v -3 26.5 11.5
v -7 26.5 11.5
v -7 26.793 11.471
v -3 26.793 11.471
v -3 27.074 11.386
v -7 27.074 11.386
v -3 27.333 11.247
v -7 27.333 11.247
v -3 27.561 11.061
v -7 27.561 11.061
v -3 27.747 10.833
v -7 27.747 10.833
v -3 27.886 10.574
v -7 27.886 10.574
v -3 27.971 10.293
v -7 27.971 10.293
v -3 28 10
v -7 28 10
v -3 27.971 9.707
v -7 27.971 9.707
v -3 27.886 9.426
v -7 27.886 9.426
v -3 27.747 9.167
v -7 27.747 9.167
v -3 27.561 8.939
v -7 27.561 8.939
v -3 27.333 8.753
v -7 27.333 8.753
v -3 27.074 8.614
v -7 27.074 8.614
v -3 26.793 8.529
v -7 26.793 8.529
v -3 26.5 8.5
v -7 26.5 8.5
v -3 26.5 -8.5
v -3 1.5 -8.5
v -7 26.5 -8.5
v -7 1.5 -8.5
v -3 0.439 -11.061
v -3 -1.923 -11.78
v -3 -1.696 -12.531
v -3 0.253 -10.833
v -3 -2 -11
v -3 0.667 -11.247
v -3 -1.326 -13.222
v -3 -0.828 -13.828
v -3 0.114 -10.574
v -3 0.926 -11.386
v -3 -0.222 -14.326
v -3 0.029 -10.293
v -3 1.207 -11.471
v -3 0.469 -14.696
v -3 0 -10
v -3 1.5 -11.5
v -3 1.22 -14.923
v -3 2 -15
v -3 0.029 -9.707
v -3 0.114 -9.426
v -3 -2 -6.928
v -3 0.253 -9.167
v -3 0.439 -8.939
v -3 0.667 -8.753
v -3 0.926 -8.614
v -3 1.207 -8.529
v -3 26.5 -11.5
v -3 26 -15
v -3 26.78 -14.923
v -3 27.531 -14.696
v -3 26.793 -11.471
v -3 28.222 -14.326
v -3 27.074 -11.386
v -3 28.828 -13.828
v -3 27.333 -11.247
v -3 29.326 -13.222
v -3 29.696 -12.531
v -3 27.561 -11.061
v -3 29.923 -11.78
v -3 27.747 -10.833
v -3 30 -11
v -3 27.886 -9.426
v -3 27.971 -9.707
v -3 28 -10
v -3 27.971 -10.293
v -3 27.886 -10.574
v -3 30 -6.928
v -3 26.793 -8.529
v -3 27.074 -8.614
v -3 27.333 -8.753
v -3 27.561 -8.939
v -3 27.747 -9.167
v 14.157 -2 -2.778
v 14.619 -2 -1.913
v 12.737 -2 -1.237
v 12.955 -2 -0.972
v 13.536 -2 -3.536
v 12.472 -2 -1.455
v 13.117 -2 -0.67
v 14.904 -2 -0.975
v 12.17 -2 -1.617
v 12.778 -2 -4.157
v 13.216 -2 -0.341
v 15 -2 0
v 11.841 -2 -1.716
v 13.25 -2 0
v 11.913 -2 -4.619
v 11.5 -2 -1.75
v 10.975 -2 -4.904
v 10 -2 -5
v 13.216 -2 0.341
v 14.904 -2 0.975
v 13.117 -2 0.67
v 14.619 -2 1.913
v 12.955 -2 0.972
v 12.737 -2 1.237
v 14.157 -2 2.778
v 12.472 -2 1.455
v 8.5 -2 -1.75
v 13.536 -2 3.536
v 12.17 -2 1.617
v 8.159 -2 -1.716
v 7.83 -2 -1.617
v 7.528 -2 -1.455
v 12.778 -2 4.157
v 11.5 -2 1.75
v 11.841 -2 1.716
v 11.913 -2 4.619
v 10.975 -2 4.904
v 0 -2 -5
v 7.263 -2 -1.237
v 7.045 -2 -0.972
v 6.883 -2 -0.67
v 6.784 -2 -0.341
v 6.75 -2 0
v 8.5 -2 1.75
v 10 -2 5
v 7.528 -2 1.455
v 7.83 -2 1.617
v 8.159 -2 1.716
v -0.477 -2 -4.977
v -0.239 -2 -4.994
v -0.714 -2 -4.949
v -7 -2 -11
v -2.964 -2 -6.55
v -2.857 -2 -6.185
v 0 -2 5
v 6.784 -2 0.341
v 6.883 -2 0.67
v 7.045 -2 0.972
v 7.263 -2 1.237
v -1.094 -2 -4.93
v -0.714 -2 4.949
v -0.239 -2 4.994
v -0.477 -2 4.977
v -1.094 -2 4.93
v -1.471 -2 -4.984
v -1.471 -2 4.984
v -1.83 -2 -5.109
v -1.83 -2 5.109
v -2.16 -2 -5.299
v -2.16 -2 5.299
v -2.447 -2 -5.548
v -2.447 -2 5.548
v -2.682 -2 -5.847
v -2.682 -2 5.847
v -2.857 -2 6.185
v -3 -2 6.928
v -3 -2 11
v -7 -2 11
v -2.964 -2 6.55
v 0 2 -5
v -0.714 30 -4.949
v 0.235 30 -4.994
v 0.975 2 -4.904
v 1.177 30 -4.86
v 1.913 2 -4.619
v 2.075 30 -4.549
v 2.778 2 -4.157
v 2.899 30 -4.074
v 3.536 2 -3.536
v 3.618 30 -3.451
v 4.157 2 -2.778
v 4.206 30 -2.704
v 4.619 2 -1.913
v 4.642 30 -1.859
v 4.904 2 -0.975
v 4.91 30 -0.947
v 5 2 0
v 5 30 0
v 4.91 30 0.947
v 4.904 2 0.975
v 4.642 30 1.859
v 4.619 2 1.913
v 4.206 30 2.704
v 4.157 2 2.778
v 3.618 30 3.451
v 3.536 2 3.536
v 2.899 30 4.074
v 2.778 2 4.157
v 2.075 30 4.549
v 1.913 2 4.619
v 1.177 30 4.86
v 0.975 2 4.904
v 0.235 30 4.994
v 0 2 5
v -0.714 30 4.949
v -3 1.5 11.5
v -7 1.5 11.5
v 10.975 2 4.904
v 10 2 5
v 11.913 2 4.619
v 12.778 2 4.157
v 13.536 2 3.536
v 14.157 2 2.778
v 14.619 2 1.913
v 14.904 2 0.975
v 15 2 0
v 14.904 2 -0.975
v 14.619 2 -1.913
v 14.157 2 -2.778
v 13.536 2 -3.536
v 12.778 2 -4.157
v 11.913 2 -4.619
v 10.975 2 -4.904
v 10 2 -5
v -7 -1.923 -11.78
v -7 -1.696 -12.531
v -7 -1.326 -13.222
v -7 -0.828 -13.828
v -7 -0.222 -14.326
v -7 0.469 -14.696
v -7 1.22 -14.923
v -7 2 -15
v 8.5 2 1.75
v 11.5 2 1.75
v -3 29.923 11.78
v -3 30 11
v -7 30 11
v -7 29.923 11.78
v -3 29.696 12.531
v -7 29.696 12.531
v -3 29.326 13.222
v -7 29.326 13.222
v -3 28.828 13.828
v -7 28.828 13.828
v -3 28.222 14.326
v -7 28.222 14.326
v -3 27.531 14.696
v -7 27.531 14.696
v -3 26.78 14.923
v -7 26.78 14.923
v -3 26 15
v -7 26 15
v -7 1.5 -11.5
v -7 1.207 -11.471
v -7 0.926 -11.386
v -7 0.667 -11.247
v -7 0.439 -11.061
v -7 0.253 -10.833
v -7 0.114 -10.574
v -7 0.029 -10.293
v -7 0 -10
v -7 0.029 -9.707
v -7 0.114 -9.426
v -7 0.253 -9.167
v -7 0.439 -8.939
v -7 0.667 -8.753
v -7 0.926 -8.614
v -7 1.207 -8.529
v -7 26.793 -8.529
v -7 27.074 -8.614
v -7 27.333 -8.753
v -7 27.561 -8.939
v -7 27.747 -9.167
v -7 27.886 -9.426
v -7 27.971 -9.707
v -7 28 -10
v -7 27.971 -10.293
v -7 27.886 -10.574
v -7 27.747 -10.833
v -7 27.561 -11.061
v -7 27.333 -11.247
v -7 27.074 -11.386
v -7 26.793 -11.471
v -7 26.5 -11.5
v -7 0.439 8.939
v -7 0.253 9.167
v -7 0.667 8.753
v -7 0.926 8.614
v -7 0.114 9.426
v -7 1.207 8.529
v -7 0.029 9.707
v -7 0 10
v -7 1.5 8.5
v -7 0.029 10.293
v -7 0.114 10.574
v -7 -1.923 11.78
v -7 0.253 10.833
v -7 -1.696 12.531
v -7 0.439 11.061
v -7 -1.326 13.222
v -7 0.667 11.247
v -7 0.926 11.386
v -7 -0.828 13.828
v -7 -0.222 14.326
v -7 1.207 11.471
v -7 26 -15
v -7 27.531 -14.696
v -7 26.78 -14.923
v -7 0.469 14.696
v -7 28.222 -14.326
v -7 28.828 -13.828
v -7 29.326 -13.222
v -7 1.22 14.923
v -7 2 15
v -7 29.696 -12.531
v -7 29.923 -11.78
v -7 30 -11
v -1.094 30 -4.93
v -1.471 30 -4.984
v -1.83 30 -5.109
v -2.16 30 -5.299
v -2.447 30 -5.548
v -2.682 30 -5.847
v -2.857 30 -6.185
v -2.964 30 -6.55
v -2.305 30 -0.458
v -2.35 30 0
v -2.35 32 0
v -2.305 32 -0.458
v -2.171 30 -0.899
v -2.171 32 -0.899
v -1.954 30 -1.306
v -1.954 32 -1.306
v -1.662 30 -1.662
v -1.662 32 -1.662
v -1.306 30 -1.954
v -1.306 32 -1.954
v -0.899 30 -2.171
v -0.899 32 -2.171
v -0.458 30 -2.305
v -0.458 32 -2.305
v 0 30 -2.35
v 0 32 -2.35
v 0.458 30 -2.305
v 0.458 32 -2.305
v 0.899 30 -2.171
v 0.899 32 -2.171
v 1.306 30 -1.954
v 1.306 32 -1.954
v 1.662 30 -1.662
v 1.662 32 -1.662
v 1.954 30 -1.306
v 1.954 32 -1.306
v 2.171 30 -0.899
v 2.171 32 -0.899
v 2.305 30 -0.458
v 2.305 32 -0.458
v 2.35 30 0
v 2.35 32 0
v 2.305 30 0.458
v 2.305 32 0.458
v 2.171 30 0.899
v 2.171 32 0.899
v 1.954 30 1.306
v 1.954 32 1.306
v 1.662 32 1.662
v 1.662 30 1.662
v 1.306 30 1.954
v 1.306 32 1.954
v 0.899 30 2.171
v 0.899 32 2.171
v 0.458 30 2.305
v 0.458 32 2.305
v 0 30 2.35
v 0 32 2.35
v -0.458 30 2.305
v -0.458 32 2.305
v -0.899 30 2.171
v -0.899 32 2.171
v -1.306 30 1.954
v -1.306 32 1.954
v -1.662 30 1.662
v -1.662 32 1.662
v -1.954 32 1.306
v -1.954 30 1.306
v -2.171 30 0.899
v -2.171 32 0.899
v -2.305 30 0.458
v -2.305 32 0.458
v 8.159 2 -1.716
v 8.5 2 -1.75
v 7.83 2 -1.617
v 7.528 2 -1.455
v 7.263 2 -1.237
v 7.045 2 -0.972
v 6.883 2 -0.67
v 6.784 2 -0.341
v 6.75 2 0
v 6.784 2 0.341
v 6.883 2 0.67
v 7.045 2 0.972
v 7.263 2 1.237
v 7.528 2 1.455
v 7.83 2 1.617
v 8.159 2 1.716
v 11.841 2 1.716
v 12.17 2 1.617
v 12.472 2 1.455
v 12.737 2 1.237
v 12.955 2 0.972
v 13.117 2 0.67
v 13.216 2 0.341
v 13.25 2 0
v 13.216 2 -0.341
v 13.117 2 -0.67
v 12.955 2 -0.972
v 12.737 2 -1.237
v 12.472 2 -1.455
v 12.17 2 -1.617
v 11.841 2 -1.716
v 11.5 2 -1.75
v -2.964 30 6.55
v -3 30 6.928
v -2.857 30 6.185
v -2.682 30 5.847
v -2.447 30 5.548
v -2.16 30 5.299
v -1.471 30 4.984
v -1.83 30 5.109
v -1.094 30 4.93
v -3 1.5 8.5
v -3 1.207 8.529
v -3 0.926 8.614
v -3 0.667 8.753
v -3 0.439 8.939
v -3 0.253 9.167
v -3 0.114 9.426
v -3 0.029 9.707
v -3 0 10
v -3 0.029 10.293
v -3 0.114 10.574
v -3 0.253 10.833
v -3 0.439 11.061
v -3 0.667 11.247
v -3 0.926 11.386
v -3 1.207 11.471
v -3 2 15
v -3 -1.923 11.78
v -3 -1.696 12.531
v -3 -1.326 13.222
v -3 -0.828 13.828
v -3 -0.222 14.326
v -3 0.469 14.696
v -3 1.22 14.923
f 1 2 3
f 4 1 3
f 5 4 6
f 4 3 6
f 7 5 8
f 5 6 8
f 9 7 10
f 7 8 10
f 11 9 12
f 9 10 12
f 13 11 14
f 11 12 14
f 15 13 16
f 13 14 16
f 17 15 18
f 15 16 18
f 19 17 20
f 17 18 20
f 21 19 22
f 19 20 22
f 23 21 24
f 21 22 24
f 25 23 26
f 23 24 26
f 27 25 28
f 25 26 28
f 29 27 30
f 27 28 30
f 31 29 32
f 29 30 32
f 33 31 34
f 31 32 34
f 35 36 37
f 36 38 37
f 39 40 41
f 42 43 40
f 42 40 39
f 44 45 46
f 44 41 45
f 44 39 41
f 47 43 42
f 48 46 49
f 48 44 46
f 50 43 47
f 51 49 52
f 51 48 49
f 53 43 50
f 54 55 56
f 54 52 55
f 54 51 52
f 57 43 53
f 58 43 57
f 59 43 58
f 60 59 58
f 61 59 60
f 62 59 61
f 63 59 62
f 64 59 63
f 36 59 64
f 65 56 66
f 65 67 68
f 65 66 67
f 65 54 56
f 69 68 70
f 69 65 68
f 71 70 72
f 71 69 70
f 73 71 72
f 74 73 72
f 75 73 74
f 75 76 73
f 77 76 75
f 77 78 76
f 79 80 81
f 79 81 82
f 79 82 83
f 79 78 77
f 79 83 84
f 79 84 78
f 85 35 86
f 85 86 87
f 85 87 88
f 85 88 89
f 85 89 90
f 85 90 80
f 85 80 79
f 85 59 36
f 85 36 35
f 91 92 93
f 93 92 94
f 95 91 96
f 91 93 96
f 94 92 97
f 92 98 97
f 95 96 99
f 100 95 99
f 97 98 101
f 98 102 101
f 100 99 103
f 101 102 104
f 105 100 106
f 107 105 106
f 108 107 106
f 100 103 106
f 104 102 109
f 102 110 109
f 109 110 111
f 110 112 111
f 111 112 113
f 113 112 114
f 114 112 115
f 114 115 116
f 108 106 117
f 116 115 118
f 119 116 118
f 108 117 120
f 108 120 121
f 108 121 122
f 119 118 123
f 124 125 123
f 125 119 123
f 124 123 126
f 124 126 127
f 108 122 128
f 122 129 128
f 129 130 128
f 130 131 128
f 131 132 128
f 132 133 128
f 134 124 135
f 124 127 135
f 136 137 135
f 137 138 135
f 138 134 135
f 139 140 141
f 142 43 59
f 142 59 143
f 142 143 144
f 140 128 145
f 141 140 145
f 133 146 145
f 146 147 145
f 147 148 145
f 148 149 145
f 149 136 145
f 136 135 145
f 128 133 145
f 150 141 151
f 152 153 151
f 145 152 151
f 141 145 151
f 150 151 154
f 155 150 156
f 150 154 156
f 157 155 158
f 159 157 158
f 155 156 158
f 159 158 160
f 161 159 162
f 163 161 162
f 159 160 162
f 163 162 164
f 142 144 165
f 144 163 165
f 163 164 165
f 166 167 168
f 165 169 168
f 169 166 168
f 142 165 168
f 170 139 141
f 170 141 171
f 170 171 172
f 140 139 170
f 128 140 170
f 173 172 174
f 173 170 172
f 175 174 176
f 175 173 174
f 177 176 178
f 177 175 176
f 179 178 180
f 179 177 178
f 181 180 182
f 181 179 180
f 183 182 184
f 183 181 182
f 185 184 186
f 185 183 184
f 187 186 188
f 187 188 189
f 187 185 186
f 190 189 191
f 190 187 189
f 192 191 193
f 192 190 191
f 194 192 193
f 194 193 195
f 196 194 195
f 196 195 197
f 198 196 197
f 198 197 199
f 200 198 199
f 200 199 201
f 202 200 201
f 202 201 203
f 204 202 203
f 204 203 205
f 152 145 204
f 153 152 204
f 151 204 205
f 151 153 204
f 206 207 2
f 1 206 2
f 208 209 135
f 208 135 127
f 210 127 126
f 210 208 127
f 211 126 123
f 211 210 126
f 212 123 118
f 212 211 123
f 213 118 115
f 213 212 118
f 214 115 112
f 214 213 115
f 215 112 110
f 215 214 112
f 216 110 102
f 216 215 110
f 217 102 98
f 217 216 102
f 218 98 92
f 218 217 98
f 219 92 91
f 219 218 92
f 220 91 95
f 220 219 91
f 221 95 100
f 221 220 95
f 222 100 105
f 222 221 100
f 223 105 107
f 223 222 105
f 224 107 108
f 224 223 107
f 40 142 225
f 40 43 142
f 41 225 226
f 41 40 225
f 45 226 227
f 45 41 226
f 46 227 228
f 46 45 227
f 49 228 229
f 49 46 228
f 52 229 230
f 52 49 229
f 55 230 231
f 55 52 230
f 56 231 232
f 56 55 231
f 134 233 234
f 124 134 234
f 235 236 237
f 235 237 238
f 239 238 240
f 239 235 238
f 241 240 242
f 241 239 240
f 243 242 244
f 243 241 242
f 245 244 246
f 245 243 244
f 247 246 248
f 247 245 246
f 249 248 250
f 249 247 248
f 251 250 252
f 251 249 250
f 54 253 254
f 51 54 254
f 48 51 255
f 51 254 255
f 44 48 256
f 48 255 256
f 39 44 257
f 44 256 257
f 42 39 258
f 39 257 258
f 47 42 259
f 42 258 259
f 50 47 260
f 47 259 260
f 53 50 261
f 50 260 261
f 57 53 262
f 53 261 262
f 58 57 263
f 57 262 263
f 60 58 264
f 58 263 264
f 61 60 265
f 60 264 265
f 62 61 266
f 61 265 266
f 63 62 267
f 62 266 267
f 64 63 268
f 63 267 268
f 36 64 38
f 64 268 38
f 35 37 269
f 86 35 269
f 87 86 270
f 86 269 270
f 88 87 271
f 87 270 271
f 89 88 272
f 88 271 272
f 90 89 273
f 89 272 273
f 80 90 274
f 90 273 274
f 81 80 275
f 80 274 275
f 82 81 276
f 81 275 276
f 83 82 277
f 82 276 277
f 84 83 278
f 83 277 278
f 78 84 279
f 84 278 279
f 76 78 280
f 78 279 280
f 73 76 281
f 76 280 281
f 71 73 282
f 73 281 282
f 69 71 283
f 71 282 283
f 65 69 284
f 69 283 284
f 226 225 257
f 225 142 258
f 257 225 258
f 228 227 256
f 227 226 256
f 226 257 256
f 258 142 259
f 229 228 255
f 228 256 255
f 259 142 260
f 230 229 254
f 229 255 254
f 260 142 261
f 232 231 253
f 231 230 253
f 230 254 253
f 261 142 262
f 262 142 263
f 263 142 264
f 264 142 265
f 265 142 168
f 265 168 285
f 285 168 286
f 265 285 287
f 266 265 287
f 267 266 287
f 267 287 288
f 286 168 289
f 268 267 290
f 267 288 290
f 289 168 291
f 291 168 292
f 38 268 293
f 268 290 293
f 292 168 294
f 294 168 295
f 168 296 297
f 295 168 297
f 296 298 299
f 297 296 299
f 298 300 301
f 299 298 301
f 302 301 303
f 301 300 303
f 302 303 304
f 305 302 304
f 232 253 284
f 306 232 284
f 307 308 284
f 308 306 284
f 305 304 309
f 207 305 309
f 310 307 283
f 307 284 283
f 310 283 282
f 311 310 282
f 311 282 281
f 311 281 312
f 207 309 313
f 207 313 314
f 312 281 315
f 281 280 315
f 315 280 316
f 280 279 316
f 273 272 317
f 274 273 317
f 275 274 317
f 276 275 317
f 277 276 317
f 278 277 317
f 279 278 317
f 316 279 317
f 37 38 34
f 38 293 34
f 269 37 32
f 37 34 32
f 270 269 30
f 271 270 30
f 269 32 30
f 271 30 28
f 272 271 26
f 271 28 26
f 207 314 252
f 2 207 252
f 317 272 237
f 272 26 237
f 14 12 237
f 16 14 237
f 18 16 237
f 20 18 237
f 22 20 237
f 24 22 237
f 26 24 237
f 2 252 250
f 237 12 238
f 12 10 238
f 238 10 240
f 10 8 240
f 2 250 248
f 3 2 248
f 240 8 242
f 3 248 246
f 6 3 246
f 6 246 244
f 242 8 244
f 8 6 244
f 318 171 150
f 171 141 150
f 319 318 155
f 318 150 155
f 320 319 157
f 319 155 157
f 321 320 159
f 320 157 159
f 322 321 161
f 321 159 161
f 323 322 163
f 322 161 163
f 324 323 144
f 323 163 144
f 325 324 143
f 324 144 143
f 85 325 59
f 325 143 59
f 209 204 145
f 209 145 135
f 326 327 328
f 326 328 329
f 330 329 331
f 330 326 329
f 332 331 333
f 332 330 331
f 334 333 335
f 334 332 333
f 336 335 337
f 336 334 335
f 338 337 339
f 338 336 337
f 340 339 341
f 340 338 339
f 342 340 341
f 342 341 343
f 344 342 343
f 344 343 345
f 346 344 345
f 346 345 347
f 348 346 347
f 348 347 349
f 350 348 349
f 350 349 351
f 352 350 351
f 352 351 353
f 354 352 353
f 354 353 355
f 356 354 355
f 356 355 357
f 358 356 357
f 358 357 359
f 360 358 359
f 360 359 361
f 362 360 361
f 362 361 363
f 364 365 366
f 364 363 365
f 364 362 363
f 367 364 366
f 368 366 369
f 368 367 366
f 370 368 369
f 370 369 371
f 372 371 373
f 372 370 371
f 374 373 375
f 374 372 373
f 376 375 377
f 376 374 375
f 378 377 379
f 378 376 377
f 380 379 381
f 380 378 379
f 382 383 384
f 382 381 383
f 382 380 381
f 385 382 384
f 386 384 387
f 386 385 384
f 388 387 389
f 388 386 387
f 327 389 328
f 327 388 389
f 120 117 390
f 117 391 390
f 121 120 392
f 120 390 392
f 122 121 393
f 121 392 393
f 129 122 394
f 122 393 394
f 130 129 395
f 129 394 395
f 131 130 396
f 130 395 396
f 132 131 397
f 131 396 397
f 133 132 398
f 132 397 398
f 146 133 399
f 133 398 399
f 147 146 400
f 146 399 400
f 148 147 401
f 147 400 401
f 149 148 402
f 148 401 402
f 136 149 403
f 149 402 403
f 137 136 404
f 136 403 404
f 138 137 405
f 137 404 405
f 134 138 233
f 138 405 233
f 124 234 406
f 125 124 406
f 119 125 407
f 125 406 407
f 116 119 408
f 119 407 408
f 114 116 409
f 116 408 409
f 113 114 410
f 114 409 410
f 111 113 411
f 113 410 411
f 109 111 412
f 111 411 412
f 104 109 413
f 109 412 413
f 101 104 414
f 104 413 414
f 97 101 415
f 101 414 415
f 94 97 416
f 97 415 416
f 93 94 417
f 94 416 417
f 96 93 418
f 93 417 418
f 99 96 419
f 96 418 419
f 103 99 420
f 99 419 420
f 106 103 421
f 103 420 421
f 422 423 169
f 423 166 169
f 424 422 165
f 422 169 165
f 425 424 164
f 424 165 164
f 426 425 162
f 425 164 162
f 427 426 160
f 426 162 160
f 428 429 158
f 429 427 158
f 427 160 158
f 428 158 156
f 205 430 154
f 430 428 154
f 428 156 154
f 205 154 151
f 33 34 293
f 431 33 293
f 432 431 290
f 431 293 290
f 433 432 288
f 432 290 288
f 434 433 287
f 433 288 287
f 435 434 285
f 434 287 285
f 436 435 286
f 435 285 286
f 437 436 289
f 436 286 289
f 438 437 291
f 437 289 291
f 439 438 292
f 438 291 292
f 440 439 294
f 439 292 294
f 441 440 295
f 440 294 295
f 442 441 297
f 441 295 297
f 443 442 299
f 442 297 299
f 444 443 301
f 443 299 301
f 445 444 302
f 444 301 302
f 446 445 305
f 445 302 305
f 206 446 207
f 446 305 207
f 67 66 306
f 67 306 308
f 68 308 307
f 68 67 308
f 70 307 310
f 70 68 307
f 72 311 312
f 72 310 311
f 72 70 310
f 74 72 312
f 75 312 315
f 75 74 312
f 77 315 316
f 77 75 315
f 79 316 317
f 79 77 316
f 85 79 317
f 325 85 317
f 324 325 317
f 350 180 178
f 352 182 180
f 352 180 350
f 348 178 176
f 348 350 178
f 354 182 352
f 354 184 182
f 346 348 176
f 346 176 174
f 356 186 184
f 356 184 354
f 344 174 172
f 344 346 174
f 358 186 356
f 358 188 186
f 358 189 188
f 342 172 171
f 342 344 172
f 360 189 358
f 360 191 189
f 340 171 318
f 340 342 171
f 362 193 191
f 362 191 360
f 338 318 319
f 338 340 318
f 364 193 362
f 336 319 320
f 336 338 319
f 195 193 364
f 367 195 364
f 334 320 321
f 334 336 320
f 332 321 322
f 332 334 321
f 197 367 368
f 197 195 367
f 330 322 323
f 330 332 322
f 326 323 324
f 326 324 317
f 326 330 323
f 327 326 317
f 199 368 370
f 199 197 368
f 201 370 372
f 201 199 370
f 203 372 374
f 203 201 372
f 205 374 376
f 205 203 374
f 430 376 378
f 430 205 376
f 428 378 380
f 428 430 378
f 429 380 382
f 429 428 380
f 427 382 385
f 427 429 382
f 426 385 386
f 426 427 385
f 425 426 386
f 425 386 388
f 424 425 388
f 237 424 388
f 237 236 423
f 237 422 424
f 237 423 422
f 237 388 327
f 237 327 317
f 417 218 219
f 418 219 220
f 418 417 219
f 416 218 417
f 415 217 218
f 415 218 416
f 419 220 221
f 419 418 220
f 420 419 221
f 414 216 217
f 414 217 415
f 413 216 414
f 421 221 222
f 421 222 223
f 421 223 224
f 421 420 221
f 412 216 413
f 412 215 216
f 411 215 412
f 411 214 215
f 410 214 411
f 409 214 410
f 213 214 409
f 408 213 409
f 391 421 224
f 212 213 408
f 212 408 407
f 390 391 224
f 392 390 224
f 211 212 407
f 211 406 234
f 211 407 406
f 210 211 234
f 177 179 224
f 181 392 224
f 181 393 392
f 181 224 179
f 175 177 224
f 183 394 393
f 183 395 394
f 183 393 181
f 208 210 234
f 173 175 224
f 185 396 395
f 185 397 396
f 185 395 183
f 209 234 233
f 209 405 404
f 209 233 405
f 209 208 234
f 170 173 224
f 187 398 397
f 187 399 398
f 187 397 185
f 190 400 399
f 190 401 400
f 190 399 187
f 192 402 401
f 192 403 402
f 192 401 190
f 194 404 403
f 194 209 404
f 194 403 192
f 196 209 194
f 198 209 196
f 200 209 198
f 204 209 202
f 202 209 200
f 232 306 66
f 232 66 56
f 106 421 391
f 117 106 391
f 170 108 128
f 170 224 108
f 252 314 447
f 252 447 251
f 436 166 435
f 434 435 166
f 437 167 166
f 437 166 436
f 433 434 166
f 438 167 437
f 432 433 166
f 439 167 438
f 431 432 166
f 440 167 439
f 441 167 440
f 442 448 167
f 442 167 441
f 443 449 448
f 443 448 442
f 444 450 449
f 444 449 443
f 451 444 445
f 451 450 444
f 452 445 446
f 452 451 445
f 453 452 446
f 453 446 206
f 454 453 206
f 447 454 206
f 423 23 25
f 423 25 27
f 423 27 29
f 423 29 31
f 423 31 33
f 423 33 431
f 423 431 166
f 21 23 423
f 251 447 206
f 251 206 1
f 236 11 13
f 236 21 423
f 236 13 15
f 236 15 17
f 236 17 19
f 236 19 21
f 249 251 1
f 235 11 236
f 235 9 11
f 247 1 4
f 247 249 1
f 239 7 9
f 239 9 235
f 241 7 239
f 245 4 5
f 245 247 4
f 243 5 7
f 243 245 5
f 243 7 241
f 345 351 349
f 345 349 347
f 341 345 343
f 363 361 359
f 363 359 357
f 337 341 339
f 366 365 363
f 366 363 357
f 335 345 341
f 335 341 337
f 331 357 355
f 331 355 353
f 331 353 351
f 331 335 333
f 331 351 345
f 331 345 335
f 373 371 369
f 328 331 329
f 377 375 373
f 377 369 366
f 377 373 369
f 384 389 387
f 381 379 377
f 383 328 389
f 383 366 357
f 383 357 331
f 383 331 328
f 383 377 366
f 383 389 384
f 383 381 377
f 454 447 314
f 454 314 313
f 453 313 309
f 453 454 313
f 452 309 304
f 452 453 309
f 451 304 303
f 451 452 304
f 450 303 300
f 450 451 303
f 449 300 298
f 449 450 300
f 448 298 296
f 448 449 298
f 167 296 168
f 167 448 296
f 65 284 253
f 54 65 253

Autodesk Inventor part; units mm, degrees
ref_plane "XZ Plane" through (0, 0, 0) normal (0, 1, 0) x (-1, 0, 0)
sketch "Sketch1" plane through (0, 0, 0) normal (0, 1, 0) x (-1, 0, 0)
  circle A0 centre (0, 0) radius 2.35
  circle A1 centre (0, 0) radius 5
  line L0 (0, 5) -> (-10, 5)
  arc A2 (-10, 5) -> (-10, -5) centre (-10, 0) ccw
  line L1 (-10, -5) -> (0, -5)
  line L2 (-8.5, 0) -> (-11.5, 0) construction
  line L3 (-8.5, 1.75) -> (-11.5, 1.75)
  line L4 (-11.5, -1.75) -> (-8.5, -1.75)
  arc A3 (-8.5, -1.75) -> (-8.5, 1.75) centre (-8.5, 0) ccw
  arc A4 (-11.5, 1.75) -> (-11.5, -1.75) centre (-11.5, 0) ccw
  dimension "d0" = 4.7
  dimension "d1" = 10
  dimension "d36" = 5
  dimension "d37" = 1.75
  dimension "d38" = 10
  dimension "d39" = 3
extrude "Extrusion1" add sketch "Sketch1" against normal blind 2 and the other way blind 2 contours A0 | A1 | A1 L1 A2 L0
extrude "Extrusion2" add sketch "Sketch1" along normal blind 30 contours A1
extrude "Extrusion3" add sketch "Sketch1" along normal blind 32 contours A0
ref_plane "Work Plane1" through (-5, 0, 0) normal (1, 0, 0) x (0, 1, 0)
ref_plane "Work Plane2" through (-7, 0, 0) normal (1, 0, 0) x (0, 1, 0)
sketch "Sketch2" plane through (-7, 0, 0) normal (1, 0, 0) x (0, 1, 0)
  line L0 (30, -15) -> (-2, -15)
  line L1 (-2, 15) -> (30, 15)
  line L2 (30, 15) -> (30, -15)
  line L3 (30, -5) -> (30, 5) projected
  line L4 (2, -5) -> (-2, -5) projected
  line L5 (-2, 5) -> (-2, -5) projected
  line L6 (2, 5) -> (-2, 5) projected
  line L7 (2, -5) -> (2, 5) projected
  line L8 (-2, -15) -> (-2, 15)
  point P0 (0, 0)
  dimension "d11" = 30
  dimension "d12" = 15
extrude "Extrusion4" add sketch "Sketch2" along normal blind 4
sketch "Sketch4" plane through (-7, 0, 0) normal (-1, 0, 0) x (0, 0, 1)
  line L0 (10, 26.5) -> (10, 1.5) construction
  line L1 (8.5, 26.5) -> (8.5, 1.5)
  line L2 (11.5, 1.5) -> (11.5, 26.5)
  arc A0 (11.5, 26.5) -> (8.5, 26.5) centre (10, 26.5) ccw
  arc A1 (8.5, 1.5) -> (11.5, 1.5) centre (10, 1.5) ccw
  line L3 (-10, 26.5) -> (-10, 1.5) construction
  line L4 (-11.5, 26.5) -> (-11.5, 1.5)
  line L5 (-8.5, 1.5) -> (-8.5, 26.5)
  arc A2 (-8.5, 26.5) -> (-11.5, 26.5) centre (-10, 26.5) ccw
  arc A3 (-11.5, 1.5) -> (-8.5, 1.5) centre (-10, 1.5) ccw
  line L6 (15, -2) -> (15, 30) projected
  line L7 (10, 14) -> (-10, 14) construction
  point P0 (0, 0)
  point P1 (15, 14)
  point P2 (0, 14)
  dimension "d30" = 20
  dimension "d31" = 1.5
  dimension "d32" = 25
extrude "Extrusion5" cut sketch "Sketch4" against normal up to surface (4 mm away)
fillet "Fillet1" radius 2 2 edges at (-3, 14, -4) (-3, 14, 4)
fillet "Fillet2" radius 4 4 edges at (-5, 30, 15) (-5, -2, 15) (-5, -2, -15) (-5, 30, -15)
properties part number "Pok Mk3 Yaw Motor Support" material "ABS Plastic"
